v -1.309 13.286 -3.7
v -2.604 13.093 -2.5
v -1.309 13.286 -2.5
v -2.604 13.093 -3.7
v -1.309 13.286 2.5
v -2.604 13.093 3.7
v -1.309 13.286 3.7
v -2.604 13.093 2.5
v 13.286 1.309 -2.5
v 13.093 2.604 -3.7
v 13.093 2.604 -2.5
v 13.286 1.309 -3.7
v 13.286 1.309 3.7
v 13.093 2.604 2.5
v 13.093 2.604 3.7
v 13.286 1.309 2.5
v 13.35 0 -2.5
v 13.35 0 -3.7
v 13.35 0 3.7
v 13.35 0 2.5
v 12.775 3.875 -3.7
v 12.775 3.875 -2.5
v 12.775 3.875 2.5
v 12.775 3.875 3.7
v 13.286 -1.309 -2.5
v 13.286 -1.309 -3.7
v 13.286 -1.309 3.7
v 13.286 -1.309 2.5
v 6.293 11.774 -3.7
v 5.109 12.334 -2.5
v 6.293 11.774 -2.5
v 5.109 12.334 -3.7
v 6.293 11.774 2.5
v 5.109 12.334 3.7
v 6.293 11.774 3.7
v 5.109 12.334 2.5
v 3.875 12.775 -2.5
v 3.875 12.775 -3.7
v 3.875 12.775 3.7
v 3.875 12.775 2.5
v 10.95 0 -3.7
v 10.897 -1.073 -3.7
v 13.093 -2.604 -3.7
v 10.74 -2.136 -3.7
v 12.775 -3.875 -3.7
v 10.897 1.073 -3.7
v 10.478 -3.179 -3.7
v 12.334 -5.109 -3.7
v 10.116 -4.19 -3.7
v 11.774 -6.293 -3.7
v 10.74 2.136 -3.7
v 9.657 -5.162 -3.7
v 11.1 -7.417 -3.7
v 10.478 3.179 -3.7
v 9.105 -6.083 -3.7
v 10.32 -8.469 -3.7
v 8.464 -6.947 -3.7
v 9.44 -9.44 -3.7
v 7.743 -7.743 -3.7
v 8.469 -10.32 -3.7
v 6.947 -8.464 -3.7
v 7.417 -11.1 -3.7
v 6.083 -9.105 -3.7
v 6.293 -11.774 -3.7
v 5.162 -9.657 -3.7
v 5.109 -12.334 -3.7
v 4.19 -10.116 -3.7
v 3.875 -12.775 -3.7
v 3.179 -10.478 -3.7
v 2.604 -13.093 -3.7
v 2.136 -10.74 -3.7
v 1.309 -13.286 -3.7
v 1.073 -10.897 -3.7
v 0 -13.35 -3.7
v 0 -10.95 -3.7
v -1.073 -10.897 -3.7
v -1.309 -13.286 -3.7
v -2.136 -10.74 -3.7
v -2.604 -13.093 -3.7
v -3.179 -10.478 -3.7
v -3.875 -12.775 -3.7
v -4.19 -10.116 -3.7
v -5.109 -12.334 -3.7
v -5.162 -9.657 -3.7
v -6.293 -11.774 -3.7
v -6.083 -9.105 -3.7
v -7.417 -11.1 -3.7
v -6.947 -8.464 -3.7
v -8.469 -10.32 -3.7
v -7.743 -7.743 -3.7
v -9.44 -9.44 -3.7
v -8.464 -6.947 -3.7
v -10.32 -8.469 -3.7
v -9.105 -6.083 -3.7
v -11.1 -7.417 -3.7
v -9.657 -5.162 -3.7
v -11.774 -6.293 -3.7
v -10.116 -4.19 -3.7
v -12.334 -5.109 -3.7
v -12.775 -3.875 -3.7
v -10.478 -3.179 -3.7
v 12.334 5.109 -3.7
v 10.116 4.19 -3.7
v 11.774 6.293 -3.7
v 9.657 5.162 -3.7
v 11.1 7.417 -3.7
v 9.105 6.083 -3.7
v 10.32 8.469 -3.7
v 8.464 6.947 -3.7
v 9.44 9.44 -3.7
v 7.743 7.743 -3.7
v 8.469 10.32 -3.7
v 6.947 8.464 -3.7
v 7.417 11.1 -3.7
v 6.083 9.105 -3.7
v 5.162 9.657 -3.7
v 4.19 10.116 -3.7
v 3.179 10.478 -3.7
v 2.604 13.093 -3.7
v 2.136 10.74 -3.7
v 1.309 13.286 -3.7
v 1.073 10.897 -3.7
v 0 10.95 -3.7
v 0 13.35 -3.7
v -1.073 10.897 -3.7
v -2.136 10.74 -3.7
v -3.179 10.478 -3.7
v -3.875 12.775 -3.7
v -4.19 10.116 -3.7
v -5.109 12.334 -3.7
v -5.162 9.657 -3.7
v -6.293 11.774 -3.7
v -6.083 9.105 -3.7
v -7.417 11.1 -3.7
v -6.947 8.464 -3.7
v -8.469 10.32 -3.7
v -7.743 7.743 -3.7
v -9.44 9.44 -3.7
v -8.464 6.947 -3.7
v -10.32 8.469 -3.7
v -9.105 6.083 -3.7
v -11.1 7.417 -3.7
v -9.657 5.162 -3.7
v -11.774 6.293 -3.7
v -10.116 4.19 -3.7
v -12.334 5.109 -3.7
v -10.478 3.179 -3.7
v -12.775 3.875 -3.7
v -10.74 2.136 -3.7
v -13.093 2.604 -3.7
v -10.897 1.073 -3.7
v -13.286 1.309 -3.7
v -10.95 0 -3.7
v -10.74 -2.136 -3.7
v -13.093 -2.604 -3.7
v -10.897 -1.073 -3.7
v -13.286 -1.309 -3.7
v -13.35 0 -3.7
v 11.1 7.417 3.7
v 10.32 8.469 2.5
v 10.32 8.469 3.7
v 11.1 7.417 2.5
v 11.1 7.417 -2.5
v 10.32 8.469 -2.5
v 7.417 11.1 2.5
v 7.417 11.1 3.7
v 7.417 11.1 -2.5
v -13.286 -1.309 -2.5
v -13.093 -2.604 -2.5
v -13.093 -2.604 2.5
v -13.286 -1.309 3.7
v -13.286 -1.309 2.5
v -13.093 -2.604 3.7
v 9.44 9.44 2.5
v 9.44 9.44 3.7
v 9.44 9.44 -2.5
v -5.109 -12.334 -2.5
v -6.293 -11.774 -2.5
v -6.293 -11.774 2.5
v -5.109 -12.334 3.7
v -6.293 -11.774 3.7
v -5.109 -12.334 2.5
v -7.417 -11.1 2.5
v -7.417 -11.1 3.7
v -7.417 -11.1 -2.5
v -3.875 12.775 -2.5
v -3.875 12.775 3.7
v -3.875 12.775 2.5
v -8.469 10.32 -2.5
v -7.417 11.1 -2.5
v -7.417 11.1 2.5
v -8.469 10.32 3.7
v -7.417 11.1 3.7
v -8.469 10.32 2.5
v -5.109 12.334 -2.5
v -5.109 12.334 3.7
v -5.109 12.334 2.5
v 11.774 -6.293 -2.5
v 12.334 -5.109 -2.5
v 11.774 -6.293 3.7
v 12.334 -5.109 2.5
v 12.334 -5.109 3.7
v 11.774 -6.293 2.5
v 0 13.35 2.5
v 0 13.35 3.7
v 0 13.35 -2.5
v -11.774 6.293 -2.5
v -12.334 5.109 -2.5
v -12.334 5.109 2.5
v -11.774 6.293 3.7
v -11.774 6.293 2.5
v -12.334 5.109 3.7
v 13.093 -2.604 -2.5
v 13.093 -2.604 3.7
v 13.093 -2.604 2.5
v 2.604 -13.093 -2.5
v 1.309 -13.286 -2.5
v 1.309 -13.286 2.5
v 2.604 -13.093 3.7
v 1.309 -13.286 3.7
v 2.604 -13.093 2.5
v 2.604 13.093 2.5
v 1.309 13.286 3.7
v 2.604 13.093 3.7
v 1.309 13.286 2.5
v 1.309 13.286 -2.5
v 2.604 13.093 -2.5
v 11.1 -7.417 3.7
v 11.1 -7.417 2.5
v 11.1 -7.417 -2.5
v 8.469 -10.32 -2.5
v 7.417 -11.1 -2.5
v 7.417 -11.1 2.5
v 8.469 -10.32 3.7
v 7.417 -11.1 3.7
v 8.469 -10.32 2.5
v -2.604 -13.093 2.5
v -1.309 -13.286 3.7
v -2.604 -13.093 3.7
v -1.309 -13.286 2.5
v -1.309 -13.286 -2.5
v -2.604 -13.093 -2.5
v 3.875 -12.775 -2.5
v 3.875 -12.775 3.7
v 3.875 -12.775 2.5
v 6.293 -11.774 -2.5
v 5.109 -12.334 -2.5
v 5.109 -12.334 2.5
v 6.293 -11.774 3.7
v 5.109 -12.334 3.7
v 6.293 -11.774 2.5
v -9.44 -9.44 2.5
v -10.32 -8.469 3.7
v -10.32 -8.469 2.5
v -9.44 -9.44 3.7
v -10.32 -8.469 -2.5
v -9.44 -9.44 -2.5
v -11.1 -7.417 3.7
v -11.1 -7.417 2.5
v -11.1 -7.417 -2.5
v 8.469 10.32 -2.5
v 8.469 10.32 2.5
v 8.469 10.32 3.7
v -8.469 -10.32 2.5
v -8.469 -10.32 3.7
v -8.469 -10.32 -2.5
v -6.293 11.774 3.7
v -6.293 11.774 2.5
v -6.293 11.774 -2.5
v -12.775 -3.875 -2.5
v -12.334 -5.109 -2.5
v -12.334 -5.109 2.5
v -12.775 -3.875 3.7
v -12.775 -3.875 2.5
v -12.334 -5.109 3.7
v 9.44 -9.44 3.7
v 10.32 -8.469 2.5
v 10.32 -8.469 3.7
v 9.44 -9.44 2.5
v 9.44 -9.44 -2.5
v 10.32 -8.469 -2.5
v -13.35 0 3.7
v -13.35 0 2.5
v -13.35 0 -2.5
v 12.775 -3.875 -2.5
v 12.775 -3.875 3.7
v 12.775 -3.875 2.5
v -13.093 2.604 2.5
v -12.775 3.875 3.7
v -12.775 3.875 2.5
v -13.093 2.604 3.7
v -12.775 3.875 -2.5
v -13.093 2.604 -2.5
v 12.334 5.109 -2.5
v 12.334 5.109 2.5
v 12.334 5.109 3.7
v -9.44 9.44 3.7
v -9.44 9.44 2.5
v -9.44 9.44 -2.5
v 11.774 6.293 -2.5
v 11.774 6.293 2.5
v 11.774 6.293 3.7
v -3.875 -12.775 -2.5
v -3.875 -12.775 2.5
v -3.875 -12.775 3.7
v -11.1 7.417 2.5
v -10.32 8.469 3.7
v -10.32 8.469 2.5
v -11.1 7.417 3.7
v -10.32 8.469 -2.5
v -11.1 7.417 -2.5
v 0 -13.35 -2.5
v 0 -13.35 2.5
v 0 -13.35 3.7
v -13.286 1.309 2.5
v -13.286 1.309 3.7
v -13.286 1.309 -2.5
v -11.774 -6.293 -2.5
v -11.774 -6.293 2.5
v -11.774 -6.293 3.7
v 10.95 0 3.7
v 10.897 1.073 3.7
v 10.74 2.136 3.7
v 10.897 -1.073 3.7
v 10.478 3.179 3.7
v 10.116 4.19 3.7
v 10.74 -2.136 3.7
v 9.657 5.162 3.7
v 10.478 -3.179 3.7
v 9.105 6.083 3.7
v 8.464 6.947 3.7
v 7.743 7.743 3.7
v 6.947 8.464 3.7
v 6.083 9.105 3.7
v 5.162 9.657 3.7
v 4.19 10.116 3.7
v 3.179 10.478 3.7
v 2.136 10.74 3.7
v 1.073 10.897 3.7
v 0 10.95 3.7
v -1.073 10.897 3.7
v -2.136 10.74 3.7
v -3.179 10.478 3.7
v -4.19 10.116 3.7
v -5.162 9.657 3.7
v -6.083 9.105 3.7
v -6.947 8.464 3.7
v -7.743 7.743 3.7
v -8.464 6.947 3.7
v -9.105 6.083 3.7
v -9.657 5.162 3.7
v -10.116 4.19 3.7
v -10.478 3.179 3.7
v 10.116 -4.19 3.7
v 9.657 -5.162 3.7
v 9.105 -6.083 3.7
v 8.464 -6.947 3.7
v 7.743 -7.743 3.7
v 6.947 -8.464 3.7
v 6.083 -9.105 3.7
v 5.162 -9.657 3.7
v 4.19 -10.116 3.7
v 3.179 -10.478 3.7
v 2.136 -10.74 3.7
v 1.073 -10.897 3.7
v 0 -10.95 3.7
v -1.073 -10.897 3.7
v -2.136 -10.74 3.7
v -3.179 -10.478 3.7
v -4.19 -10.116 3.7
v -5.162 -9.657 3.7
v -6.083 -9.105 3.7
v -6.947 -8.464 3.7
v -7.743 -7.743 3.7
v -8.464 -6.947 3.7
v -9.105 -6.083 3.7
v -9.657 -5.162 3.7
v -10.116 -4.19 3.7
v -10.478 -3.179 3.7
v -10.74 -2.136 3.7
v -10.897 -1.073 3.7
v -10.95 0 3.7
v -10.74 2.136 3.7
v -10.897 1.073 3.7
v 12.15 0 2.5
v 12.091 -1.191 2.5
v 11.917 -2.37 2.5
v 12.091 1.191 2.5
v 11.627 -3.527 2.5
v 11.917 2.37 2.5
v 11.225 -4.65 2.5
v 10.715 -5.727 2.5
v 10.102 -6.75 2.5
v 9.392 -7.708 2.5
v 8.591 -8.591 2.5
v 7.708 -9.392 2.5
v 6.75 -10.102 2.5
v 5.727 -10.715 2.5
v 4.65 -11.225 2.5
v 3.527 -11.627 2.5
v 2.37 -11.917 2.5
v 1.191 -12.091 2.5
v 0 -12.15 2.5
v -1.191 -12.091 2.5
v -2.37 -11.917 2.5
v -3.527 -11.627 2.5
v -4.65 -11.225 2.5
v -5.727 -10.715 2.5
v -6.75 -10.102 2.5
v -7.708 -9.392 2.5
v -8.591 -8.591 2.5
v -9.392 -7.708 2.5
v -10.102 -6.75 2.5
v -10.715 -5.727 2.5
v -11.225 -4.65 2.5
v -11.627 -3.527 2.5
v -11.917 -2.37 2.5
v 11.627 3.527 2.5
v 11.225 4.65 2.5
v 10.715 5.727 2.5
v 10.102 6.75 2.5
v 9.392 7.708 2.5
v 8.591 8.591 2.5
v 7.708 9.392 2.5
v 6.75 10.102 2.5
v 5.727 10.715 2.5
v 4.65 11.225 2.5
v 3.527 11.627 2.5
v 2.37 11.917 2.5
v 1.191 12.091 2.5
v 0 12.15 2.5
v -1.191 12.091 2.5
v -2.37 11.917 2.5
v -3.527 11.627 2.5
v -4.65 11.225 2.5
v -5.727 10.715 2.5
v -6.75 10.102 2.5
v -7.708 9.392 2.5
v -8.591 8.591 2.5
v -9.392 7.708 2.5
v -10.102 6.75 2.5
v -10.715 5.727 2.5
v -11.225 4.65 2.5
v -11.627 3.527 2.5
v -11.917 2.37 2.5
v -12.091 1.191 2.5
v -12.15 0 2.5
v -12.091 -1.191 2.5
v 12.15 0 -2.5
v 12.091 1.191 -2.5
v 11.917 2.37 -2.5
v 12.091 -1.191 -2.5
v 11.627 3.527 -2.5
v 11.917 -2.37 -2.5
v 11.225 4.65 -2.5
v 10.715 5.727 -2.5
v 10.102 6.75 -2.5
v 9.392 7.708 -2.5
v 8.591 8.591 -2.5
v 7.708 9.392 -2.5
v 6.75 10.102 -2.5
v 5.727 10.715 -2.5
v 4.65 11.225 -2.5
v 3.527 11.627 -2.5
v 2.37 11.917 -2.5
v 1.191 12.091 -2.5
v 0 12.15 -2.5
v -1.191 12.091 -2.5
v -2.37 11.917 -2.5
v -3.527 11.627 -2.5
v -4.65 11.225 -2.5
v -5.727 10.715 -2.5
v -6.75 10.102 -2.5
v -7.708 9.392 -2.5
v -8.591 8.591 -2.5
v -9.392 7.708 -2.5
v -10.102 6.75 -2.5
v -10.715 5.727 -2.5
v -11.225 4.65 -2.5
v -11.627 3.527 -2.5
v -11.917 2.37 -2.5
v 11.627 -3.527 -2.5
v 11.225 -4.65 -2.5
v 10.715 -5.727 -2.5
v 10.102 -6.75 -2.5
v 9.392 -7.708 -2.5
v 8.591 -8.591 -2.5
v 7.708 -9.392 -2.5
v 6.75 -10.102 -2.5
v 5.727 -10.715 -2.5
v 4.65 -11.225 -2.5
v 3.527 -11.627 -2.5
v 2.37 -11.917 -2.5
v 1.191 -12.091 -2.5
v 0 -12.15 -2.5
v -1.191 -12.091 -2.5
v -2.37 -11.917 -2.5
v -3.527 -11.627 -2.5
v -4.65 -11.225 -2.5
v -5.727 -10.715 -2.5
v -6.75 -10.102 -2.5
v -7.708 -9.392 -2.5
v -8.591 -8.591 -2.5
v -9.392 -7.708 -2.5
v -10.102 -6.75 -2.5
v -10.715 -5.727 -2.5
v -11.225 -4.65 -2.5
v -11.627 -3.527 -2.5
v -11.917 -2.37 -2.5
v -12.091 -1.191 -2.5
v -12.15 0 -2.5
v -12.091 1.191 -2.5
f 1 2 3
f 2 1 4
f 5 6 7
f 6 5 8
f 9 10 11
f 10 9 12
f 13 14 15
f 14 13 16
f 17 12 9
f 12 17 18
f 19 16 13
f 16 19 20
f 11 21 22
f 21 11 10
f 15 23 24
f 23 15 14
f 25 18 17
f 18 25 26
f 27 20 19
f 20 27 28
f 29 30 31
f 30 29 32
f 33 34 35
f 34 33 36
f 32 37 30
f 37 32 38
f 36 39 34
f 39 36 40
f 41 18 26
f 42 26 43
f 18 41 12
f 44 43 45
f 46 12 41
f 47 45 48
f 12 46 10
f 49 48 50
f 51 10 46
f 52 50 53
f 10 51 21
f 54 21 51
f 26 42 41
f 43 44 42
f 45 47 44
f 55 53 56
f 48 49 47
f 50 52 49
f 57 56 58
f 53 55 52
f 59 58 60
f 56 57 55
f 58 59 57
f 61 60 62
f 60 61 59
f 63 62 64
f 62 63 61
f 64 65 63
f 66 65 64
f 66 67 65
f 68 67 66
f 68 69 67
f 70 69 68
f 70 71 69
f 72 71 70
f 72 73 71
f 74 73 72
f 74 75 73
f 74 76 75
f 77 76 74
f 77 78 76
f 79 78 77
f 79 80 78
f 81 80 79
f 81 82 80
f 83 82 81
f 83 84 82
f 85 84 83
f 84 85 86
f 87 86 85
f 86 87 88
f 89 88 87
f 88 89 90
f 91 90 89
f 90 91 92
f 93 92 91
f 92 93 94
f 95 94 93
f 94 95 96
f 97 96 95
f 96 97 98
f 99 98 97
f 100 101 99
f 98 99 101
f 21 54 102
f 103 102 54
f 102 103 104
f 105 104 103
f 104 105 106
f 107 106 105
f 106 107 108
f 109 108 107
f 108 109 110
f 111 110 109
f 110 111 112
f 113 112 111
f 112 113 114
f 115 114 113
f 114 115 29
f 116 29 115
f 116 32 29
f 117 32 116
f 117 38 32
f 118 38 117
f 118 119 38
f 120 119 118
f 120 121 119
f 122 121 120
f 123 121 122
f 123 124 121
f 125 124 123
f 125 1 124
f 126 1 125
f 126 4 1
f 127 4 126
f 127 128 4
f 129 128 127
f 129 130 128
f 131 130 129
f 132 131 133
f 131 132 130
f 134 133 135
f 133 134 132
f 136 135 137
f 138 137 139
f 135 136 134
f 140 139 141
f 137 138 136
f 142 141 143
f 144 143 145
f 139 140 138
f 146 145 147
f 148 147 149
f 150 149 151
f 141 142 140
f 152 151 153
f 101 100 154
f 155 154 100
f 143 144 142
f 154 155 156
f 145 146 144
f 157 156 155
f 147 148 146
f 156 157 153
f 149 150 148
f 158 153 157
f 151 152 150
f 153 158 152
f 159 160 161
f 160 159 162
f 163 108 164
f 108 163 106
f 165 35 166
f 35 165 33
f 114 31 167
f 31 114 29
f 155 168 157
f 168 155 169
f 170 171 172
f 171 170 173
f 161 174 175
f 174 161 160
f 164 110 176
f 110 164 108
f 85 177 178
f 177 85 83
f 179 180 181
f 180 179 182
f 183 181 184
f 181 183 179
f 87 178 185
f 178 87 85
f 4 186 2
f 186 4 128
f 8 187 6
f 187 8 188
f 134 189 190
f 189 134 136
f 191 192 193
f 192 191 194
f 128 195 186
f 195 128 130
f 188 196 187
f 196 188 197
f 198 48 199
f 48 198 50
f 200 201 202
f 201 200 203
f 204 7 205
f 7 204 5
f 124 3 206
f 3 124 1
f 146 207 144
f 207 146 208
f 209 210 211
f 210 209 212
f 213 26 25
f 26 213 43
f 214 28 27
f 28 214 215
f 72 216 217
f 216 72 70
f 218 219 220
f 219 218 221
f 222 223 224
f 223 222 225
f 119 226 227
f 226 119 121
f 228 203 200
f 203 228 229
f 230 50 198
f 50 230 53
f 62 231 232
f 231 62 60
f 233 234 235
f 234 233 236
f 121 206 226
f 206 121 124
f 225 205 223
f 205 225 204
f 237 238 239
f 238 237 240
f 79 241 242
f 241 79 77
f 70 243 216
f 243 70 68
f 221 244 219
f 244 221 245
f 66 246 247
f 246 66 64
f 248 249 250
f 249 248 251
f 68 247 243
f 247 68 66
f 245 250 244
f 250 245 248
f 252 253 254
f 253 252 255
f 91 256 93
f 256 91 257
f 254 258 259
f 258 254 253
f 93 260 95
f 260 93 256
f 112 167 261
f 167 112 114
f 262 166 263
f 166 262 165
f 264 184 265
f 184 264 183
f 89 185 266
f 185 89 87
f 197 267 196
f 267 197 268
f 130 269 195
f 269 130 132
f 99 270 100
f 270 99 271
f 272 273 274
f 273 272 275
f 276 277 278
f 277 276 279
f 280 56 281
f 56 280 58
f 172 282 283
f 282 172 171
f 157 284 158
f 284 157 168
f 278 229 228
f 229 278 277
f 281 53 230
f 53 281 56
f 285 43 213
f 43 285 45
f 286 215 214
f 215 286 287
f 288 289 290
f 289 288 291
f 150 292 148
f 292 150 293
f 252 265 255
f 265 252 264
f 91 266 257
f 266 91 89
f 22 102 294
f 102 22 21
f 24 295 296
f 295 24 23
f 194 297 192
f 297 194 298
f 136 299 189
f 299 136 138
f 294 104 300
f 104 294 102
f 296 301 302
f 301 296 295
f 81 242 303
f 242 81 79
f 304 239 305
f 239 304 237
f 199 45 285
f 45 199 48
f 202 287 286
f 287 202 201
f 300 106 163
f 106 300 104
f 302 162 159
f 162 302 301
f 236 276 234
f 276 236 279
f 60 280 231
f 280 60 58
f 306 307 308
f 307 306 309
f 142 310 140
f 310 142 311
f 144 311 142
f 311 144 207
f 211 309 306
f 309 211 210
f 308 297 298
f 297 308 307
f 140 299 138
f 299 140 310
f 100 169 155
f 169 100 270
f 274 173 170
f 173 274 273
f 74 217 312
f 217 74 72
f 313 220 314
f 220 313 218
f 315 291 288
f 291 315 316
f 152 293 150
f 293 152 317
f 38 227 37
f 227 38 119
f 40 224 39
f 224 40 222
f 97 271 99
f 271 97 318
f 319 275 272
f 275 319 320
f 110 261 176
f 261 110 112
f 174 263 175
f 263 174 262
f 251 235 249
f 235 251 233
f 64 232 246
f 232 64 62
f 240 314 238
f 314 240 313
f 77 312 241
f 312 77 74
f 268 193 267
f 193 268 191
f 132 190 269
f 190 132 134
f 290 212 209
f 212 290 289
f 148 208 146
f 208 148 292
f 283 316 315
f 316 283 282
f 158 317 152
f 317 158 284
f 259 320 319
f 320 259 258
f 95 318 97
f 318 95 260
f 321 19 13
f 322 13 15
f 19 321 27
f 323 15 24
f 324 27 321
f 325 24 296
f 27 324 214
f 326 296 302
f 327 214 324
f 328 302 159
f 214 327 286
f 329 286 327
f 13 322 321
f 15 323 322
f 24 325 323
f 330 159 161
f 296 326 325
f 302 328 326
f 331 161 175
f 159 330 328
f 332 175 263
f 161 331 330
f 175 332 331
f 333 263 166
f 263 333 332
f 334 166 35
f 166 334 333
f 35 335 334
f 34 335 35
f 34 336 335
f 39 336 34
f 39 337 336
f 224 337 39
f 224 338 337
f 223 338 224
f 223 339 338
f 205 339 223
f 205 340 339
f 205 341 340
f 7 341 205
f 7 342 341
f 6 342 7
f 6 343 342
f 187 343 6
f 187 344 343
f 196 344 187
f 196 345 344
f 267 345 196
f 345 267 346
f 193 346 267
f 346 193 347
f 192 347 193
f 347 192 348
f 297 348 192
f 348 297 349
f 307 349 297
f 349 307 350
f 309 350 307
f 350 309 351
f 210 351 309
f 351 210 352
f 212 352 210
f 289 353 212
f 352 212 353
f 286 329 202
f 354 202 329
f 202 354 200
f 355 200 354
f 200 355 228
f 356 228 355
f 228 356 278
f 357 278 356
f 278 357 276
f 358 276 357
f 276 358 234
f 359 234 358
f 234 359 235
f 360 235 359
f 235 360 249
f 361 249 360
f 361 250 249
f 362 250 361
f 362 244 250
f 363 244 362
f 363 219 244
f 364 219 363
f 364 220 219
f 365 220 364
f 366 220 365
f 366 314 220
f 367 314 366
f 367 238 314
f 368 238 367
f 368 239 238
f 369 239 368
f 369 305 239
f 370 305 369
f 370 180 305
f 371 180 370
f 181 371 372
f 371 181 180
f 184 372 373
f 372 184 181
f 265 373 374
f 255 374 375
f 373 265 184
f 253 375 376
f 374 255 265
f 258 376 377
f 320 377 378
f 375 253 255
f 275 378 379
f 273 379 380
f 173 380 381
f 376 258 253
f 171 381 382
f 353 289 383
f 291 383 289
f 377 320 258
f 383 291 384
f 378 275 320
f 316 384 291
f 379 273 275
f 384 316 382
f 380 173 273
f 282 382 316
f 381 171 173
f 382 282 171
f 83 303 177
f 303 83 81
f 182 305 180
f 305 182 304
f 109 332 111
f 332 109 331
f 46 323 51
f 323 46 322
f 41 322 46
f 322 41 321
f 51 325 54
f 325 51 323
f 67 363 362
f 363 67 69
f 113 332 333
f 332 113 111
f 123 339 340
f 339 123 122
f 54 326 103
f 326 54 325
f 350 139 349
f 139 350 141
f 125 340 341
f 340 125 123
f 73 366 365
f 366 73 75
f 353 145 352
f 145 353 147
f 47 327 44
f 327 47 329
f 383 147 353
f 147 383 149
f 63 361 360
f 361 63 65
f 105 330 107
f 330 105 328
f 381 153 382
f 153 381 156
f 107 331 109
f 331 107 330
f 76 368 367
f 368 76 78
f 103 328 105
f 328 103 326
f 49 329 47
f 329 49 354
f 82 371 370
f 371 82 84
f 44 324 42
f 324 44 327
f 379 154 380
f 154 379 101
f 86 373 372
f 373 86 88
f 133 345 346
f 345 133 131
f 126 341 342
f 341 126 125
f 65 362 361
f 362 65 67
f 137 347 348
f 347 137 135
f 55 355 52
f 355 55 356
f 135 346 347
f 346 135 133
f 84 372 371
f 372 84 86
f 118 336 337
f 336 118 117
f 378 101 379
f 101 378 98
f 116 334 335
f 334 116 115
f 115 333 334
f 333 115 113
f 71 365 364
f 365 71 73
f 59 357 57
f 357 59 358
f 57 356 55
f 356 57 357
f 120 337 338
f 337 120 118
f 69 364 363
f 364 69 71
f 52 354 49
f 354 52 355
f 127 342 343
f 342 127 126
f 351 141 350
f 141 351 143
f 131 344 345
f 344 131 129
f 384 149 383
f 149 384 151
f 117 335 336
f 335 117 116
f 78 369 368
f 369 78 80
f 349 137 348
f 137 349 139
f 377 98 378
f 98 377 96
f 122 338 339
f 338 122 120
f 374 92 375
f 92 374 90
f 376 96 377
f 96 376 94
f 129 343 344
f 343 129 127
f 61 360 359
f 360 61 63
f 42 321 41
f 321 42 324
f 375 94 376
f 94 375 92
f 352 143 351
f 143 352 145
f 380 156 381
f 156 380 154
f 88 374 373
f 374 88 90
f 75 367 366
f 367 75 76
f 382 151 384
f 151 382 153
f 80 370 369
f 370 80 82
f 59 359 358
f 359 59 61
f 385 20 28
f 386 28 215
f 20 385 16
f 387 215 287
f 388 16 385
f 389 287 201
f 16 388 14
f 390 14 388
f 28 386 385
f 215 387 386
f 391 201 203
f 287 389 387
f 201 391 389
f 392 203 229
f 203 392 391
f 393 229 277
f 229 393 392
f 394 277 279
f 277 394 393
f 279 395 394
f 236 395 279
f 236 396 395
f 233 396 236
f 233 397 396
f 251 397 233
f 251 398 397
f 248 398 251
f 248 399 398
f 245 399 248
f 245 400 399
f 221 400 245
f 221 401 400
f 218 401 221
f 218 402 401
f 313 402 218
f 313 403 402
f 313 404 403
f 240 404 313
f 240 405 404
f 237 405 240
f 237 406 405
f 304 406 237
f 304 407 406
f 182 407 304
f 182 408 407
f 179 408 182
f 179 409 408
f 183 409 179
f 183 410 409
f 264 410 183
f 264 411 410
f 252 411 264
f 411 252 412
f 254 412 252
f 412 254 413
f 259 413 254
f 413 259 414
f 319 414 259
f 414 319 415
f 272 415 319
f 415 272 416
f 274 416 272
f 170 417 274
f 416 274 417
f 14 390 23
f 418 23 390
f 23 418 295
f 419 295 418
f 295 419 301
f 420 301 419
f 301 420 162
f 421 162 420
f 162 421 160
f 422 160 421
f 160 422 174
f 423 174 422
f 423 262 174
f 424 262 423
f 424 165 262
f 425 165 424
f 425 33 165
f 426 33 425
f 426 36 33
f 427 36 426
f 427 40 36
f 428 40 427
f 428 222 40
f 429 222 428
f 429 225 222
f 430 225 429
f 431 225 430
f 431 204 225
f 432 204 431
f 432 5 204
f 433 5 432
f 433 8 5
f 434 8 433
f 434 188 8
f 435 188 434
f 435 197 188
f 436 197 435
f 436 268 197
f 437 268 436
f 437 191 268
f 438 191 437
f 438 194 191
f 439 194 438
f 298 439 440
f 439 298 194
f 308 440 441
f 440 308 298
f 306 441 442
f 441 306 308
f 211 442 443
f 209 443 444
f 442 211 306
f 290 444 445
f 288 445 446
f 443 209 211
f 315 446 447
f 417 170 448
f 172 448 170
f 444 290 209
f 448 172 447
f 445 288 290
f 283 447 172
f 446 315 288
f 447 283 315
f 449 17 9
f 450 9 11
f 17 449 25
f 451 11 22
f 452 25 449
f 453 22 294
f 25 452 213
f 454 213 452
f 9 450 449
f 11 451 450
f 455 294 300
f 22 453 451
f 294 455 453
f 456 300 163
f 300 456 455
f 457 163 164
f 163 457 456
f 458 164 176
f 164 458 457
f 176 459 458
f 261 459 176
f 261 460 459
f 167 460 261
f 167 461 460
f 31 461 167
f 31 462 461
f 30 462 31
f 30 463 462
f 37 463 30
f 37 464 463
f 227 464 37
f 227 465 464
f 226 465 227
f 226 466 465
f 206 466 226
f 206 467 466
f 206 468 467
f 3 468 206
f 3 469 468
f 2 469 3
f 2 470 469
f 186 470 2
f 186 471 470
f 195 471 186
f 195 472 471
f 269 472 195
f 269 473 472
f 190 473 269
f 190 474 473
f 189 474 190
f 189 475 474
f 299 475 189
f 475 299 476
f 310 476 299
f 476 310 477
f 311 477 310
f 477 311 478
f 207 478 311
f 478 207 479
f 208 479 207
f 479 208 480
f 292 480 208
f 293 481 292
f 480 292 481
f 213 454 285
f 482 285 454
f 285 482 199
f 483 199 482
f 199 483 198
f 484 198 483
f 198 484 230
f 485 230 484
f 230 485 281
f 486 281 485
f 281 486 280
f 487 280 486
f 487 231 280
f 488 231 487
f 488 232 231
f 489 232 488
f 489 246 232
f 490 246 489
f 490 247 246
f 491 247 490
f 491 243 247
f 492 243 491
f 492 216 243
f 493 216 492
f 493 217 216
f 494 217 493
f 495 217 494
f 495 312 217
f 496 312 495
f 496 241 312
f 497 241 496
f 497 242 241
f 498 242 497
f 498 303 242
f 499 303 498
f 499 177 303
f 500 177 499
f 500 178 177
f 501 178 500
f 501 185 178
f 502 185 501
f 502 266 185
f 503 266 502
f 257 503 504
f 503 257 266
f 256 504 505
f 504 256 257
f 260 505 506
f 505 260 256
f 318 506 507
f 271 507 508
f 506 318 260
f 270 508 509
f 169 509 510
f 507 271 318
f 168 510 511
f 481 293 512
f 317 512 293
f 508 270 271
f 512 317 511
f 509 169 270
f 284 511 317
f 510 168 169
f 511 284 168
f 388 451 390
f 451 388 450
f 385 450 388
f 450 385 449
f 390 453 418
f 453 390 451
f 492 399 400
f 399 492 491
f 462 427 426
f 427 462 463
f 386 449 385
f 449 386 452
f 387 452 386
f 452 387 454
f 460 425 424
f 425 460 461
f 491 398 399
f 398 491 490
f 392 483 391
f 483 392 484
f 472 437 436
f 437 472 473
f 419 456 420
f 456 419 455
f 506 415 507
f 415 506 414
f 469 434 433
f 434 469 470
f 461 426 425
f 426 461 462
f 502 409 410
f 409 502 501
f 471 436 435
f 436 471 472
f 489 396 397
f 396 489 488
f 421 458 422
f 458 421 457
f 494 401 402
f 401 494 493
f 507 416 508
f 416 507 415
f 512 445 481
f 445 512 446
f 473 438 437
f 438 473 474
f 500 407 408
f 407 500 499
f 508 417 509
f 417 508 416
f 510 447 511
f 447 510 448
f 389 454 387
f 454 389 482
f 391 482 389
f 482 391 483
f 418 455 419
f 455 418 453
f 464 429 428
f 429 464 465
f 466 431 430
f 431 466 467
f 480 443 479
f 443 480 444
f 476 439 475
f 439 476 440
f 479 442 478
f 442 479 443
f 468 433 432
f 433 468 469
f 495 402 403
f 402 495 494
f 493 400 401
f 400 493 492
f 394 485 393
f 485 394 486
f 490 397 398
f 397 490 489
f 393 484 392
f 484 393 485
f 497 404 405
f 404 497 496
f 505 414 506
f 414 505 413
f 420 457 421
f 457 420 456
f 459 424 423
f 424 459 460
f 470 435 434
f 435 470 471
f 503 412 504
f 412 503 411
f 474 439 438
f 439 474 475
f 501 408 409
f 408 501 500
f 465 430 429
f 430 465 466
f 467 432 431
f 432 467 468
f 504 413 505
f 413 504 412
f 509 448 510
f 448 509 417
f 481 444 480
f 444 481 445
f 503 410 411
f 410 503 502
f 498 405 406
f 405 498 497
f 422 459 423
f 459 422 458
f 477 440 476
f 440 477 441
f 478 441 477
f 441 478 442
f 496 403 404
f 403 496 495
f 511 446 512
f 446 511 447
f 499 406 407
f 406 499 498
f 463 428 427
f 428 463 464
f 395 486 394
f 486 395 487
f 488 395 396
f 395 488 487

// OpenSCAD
$fn=64;
t = 1.2;
d0 = 24.3;
h_metal=5;


module ring(h, d_outer, d_inner) {
    difference() {
        cylinder(h=h, d=d_outer, center=true);
        cylinder(h=h, d=d_inner, center=true);
    }
}


difference() {
    ring(h=h_metal + 2 * t, d_outer=d0 + 2 * t, d_inner = d0 - 2 * t);
    ring(h=h_metal, d_outer = d0 + 2 * t+0.1, d_inner = d0);
}
